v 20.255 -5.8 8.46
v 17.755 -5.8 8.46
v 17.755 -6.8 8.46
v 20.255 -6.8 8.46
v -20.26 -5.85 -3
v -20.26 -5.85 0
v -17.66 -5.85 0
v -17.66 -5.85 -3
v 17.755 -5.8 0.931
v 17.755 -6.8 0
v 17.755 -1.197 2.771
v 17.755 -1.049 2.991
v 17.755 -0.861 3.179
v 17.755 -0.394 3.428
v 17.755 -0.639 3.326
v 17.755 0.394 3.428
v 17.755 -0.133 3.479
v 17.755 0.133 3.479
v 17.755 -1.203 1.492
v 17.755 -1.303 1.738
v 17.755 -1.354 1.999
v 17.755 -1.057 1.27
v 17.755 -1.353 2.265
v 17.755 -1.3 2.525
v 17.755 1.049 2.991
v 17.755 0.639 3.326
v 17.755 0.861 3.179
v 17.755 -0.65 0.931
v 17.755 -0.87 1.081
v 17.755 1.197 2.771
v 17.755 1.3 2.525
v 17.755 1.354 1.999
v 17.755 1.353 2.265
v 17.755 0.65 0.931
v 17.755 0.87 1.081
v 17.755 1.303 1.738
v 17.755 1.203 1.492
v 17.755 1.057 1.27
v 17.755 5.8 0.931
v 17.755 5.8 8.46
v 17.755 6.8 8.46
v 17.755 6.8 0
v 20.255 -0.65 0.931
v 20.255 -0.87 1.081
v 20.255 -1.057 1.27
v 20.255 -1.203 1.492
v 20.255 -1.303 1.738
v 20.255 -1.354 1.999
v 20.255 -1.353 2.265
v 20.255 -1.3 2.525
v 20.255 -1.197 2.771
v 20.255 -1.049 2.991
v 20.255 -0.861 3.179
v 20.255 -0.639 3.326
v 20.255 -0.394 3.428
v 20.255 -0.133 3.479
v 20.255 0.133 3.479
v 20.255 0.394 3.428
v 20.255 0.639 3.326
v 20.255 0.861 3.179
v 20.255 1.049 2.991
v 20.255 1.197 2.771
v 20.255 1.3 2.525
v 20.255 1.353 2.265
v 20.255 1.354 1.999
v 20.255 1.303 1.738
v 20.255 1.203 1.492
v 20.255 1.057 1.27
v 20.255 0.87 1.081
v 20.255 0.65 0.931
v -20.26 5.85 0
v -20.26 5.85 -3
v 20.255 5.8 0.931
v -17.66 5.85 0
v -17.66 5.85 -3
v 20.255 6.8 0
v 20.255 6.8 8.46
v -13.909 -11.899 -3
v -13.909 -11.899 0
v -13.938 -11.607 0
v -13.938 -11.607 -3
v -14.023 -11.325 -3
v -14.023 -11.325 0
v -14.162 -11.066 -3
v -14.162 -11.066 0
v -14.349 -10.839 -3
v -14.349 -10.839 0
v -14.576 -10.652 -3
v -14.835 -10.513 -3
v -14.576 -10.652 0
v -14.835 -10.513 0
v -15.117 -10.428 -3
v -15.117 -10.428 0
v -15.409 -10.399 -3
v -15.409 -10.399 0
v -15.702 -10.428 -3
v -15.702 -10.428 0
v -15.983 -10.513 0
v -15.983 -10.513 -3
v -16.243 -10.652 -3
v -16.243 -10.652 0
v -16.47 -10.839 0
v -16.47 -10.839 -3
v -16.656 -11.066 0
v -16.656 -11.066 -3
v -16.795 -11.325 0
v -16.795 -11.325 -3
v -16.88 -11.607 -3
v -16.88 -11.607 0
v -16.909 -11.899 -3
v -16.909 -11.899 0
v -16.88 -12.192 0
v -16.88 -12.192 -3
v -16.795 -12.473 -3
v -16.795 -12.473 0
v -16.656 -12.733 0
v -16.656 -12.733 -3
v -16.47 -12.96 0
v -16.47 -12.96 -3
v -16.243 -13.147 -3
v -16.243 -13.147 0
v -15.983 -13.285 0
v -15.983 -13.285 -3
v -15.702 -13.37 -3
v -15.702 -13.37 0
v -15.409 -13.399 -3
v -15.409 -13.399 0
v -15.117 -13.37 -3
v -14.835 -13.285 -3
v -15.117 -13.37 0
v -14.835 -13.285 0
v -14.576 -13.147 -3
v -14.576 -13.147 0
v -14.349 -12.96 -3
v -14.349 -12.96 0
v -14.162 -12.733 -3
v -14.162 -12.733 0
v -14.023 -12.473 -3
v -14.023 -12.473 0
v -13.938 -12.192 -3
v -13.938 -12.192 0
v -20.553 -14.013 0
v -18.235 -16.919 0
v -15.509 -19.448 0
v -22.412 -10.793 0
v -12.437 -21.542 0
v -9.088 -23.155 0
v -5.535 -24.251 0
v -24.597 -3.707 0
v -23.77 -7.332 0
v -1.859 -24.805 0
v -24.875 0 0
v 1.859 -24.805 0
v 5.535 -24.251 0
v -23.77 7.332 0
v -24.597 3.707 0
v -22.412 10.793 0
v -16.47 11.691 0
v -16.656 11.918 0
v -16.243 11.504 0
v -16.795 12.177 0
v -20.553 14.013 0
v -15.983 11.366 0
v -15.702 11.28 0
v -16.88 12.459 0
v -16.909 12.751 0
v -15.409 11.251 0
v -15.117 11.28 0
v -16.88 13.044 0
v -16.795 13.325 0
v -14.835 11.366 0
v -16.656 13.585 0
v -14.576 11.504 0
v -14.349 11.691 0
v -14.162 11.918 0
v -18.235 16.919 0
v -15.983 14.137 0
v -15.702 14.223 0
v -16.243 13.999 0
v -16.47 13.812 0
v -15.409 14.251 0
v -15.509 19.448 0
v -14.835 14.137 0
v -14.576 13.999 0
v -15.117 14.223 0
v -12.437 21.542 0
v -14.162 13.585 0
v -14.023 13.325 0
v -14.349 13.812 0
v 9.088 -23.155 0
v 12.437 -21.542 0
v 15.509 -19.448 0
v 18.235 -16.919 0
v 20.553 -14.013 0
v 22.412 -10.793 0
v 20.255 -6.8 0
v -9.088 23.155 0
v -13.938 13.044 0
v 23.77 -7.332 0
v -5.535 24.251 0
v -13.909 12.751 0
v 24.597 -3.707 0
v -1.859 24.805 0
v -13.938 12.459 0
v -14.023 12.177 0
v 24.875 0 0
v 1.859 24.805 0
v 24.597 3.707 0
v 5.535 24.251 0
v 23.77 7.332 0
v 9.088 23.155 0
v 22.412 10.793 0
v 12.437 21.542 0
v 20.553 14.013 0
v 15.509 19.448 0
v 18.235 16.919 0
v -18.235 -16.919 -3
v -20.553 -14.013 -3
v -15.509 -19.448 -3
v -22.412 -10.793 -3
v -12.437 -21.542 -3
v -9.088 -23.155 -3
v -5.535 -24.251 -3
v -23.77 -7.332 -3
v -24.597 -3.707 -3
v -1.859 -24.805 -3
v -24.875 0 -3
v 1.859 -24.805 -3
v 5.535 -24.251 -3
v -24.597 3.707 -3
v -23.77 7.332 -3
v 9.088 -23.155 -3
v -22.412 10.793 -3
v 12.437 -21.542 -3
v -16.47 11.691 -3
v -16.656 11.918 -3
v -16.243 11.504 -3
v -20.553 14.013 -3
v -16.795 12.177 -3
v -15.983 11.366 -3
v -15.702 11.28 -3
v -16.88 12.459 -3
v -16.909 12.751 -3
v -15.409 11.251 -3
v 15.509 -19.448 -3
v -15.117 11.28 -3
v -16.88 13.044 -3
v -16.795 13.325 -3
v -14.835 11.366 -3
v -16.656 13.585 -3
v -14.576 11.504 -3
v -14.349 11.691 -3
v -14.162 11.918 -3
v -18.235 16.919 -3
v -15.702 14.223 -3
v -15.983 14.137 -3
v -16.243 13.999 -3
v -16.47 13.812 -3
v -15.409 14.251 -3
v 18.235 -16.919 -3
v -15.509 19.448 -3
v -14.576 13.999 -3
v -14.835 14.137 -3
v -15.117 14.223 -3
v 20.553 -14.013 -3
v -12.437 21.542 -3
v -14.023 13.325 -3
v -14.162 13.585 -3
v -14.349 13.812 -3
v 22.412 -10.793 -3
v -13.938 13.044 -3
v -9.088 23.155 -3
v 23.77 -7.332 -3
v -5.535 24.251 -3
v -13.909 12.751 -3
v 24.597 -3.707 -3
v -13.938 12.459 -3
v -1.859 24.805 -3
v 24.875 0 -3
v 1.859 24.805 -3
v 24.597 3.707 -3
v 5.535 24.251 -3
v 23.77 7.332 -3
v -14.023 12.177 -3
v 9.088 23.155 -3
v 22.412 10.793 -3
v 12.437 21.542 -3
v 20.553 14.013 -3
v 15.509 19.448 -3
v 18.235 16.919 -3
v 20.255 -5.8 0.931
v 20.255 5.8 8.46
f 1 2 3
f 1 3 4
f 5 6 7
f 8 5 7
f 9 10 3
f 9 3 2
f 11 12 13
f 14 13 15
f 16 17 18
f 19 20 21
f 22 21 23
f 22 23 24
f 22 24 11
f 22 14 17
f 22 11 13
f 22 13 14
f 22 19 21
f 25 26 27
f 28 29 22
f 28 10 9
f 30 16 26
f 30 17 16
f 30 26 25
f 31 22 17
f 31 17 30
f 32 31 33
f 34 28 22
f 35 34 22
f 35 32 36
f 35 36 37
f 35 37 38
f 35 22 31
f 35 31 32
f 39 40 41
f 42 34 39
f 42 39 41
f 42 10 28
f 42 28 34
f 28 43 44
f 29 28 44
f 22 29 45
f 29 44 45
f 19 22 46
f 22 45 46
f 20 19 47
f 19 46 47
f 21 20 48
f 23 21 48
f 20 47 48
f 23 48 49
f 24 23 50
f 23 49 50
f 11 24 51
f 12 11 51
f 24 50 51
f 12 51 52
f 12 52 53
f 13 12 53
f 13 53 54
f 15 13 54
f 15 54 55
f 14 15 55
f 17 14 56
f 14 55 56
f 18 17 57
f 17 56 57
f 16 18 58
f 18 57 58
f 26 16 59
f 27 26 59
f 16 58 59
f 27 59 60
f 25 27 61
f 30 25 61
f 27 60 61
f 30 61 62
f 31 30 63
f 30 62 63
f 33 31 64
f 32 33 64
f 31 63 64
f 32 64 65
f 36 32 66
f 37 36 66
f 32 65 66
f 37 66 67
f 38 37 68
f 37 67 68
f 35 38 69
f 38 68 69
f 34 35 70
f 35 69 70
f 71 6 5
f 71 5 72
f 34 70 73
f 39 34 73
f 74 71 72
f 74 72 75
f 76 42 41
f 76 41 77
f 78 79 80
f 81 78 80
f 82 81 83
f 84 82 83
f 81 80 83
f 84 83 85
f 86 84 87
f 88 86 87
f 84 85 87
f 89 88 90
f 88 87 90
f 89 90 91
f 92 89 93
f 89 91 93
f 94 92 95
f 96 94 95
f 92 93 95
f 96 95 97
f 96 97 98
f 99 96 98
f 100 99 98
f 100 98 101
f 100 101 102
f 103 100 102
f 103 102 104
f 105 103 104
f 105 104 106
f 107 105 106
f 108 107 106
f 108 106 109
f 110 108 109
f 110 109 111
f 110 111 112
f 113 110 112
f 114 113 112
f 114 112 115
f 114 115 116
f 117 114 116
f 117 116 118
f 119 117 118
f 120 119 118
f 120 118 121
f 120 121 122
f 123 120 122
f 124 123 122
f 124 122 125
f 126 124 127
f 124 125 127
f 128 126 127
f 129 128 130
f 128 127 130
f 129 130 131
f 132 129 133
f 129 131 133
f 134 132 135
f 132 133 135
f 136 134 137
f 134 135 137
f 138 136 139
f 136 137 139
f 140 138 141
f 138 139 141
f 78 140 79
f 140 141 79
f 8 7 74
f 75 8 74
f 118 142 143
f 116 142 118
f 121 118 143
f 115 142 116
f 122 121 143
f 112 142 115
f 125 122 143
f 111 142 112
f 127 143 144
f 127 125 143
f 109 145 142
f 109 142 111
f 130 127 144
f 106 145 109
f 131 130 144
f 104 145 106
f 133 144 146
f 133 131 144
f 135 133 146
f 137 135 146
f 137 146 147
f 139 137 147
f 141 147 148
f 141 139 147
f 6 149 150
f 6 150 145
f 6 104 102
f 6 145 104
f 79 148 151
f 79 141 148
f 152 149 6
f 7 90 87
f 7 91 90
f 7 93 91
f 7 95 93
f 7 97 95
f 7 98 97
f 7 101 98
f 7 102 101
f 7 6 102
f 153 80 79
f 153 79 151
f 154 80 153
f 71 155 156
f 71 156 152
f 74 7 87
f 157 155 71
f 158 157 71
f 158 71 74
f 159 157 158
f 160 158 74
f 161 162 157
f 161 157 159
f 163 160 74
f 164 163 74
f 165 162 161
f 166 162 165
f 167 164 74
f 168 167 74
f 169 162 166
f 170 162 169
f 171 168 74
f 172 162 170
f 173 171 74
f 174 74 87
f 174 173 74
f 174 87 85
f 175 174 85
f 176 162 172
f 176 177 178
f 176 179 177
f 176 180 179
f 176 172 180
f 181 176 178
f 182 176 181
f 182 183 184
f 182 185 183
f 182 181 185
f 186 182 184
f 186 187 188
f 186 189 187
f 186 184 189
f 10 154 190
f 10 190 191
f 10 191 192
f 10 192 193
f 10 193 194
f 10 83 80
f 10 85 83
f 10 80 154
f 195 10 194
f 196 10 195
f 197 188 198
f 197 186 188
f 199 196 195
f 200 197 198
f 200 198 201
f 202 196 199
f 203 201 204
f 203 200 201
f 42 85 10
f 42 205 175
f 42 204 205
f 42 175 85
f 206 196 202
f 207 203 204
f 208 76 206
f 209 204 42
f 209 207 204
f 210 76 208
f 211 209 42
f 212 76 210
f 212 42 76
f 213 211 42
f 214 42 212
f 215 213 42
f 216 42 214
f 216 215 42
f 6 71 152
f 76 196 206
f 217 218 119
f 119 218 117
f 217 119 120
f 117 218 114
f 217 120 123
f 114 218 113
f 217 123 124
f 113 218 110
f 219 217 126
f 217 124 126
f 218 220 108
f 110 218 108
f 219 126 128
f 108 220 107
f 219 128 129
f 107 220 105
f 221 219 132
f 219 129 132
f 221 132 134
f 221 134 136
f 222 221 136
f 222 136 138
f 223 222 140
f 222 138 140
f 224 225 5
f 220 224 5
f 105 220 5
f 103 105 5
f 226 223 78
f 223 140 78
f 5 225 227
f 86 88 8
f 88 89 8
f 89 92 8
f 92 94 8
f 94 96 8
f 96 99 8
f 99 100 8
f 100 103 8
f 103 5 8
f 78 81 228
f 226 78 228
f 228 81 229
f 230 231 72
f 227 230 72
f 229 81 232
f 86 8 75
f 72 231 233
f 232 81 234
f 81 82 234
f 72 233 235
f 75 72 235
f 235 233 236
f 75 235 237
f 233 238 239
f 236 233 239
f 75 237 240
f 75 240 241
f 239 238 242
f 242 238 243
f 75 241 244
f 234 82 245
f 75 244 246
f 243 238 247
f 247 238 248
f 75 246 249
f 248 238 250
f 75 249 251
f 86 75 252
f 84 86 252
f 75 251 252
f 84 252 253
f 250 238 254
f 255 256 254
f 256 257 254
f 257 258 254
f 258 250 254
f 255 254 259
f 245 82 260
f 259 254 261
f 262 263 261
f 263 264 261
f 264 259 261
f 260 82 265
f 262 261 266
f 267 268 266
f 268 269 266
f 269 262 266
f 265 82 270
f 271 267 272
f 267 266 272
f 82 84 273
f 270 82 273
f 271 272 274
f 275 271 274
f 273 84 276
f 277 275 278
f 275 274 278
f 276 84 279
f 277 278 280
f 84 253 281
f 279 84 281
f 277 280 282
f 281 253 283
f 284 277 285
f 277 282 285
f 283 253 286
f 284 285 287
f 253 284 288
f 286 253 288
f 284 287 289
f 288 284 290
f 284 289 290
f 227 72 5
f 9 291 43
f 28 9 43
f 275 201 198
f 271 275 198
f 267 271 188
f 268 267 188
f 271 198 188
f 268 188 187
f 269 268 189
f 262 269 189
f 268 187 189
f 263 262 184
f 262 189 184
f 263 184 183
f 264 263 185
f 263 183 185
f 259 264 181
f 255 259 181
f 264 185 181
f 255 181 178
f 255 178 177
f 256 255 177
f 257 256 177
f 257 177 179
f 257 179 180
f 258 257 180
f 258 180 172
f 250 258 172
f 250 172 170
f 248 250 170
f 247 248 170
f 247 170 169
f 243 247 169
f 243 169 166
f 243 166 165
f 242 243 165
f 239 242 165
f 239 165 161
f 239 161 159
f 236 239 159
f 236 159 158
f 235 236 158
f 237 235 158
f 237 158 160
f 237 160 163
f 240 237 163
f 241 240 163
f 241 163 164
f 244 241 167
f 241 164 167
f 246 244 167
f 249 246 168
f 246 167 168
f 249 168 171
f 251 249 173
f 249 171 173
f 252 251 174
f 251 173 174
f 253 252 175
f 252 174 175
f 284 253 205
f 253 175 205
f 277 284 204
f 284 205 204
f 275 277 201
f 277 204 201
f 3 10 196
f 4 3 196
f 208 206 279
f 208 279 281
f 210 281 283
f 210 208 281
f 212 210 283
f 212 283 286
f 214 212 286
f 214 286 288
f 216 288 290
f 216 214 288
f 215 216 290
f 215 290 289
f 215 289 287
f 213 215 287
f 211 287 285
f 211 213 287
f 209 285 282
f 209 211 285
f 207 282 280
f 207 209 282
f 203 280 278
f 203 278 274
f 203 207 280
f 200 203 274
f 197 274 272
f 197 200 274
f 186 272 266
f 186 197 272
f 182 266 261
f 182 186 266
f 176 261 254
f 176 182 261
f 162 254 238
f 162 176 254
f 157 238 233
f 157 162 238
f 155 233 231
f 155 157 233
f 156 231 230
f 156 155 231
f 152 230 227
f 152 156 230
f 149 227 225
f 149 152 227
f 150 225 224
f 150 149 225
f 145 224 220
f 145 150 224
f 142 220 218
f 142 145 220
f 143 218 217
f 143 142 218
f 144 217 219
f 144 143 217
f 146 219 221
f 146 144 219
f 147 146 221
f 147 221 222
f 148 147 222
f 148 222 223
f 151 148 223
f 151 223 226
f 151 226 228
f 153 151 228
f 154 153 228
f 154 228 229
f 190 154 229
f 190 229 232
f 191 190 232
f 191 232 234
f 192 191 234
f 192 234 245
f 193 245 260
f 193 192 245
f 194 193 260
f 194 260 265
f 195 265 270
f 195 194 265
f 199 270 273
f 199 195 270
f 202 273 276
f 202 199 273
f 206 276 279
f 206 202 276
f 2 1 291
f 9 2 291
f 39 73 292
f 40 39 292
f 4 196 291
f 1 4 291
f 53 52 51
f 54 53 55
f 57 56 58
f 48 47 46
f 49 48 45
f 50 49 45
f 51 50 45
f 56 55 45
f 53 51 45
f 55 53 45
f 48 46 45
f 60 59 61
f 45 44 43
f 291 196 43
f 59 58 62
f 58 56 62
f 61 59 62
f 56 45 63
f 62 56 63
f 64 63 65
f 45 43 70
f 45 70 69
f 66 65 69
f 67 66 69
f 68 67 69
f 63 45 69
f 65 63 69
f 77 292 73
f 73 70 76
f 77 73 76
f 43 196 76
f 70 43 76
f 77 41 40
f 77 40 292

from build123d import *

# Parameters (mm, degrees)
SKETCH1_R           = 24.875
BOSS_EXTRUDE2_DEPTH = 3
SKETCH1_4_W         = 2.5
SKETCH1_4_H         = 13.6
BOSS_EXTRUDE3_DEPTH = 8.46
CUT_EXTRUDE1_DEPTH  = 2.5
SKETCH10_R          = 1.5
CUT_EXTRUDE3_DEPTH  = 4.95
SKETCH5_W           = 2.6
SKETCH5_H           = 11.7
CUT_EXTRUDE4_DEPTH  = 4.95


with BuildPart() as part:
    # Sketch1 → Boss-Extrude2 (new body)
    with BuildSketch(Plane.XY):
        Circle(SKETCH1_R)
    extrude(amount=-BOSS_EXTRUDE2_DEPTH)

    # Sketch1<4> → Boss-Extrude3 (add)
    with BuildSketch(Plane.XY):
        with Locations((19.005, 0)):
            Rectangle(SKETCH1_4_W, SKETCH1_4_H)
    extrude(amount=BOSS_EXTRUDE3_DEPTH)

    # Sketch4 → Cut-Extrude1 (cut)
    with BuildSketch(Plane(origin=(20.255, 0, 0), x_dir=(0, 0, -1), z_dir=(1, 0, 0))):
        with BuildLine():
            ThreePointArc((-0.931303911, -0.65), (-3.48591682, 0), (-0.931303911, 0.65))
            Line((-0.931303911, 0.65), (-0.931303911, 5.8))
            Line((-0.931303911, 5.8), (-8.46, 5.8))
            Line((-8.46, 5.8), (-8.46, -5.8))
            Line((-8.46, -5.8), (-0.931303911, -5.8))
            Line((-0.931303911, -5.8), (-0.931303911, -0.65))
        make_face()
    extrude(amount=-CUT_EXTRUDE1_DEPTH, mode=Mode.SUBTRACT)

    # Sketch10 → Cut-Extrude3 (cut)
    with BuildSketch(Plane.XY):
        with Locations((-15.409206931, 12.75144494)):
            Circle(SKETCH10_R)
        with Locations((-15.409206931, -11.899319199)):
            Circle(SKETCH10_R)
    extrude(amount=-CUT_EXTRUDE3_DEPTH, mode=Mode.SUBTRACT)

    # Sketch5 → Cut-Extrude4 (cut)
    with BuildSketch(Plane.XY):
        with Locations((-18.96, 0)):
            Rectangle(SKETCH5_W, SKETCH5_H)
    extrude(amount=-CUT_EXTRUDE4_DEPTH, mode=Mode.SUBTRACT)


solid = part.part
